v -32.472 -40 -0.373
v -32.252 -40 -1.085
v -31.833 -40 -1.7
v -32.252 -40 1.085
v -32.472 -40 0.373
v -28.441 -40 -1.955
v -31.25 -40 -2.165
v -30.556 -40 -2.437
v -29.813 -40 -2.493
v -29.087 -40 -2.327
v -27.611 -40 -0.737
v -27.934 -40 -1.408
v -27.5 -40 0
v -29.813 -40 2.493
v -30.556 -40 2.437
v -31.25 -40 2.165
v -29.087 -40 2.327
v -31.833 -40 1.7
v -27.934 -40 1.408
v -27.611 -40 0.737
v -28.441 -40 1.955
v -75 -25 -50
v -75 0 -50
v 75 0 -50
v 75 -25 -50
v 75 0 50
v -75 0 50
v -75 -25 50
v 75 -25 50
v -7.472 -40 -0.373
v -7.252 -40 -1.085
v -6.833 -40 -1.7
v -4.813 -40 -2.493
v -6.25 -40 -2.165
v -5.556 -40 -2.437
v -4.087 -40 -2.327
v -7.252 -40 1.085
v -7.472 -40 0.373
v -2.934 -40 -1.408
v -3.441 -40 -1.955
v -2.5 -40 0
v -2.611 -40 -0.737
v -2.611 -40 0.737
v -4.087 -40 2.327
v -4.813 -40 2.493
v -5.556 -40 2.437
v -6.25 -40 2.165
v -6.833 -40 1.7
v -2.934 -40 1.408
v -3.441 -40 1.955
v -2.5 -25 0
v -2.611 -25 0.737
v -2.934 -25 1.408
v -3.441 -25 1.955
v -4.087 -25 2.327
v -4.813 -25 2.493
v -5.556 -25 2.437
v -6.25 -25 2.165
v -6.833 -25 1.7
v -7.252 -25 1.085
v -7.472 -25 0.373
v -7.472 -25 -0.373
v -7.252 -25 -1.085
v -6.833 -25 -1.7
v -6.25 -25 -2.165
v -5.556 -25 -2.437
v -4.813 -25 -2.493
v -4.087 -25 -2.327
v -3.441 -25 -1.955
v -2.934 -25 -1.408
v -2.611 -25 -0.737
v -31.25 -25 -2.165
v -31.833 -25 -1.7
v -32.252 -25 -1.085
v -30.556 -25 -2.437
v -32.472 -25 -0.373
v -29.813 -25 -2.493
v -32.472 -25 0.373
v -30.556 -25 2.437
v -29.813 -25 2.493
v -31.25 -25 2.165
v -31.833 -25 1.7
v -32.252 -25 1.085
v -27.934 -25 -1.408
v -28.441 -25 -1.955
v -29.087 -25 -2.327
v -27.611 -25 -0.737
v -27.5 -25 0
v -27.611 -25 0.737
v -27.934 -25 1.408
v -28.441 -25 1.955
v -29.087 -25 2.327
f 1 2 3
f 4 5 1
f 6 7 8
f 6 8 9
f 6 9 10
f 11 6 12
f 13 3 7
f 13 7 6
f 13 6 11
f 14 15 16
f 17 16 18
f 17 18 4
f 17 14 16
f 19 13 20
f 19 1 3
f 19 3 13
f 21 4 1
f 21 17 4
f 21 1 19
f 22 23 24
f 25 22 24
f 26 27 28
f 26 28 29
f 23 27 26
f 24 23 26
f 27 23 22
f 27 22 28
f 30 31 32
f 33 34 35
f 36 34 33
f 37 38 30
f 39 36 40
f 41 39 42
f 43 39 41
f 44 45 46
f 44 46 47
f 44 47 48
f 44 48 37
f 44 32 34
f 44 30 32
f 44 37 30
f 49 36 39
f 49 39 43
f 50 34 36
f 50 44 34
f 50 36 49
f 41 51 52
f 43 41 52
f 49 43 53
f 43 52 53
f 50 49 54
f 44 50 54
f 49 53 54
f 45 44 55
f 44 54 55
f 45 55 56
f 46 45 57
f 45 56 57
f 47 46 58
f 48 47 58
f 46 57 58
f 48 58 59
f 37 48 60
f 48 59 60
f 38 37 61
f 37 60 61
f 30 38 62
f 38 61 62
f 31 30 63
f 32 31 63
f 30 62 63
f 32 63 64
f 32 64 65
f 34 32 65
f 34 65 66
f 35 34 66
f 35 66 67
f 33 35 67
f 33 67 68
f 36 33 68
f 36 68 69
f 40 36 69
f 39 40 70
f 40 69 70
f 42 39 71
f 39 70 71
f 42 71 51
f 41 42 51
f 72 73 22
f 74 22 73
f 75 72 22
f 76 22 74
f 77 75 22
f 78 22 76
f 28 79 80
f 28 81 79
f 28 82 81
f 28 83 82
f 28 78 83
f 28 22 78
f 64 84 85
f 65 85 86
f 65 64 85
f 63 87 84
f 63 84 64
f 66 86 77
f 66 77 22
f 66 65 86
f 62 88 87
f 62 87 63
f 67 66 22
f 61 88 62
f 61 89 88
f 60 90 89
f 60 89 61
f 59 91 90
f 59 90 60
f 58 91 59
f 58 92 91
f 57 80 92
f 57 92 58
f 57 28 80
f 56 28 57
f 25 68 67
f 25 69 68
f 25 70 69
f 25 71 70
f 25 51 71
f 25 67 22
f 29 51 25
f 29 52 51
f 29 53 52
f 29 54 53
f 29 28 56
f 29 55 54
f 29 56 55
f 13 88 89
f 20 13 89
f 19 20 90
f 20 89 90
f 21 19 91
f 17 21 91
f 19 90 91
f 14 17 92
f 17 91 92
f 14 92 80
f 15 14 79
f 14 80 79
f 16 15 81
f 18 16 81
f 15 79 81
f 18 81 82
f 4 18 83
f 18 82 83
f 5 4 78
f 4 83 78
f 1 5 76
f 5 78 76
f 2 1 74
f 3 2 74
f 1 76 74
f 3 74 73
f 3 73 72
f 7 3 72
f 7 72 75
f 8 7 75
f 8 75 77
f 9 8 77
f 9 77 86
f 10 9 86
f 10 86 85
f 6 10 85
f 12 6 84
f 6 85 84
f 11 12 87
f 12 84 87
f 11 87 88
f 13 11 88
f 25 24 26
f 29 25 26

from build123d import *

# Parameters (mm, degrees)
F0_W     = 150
F0_H     = 100
F1_DEPTH = 25
F2_R     = 2.5
F3_DEPTH = 15
F4_R     = 2.5
F5_DEPTH = 15


with BuildPart() as f1:
    # F0 (on Front) → F1 (new body)
    with BuildSketch(Plane.XZ):
        Rectangle(F0_W, F0_H)
    extrude(amount=F1_DEPTH)

    # F2 (on face) → F3 (join)
    with BuildSketch(Plane.XZ.offset(25)):
        with Locations((-30, 0)):
            Circle(F2_R)
    extrude(amount=F3_DEPTH)

    # F4 (on face) → F5 (join)
    with BuildSketch(Plane.XZ.offset(25)):
        with Locations((-5, 0)):
            Circle(F4_R)
    extrude(amount=F5_DEPTH)


solid = f1.part
